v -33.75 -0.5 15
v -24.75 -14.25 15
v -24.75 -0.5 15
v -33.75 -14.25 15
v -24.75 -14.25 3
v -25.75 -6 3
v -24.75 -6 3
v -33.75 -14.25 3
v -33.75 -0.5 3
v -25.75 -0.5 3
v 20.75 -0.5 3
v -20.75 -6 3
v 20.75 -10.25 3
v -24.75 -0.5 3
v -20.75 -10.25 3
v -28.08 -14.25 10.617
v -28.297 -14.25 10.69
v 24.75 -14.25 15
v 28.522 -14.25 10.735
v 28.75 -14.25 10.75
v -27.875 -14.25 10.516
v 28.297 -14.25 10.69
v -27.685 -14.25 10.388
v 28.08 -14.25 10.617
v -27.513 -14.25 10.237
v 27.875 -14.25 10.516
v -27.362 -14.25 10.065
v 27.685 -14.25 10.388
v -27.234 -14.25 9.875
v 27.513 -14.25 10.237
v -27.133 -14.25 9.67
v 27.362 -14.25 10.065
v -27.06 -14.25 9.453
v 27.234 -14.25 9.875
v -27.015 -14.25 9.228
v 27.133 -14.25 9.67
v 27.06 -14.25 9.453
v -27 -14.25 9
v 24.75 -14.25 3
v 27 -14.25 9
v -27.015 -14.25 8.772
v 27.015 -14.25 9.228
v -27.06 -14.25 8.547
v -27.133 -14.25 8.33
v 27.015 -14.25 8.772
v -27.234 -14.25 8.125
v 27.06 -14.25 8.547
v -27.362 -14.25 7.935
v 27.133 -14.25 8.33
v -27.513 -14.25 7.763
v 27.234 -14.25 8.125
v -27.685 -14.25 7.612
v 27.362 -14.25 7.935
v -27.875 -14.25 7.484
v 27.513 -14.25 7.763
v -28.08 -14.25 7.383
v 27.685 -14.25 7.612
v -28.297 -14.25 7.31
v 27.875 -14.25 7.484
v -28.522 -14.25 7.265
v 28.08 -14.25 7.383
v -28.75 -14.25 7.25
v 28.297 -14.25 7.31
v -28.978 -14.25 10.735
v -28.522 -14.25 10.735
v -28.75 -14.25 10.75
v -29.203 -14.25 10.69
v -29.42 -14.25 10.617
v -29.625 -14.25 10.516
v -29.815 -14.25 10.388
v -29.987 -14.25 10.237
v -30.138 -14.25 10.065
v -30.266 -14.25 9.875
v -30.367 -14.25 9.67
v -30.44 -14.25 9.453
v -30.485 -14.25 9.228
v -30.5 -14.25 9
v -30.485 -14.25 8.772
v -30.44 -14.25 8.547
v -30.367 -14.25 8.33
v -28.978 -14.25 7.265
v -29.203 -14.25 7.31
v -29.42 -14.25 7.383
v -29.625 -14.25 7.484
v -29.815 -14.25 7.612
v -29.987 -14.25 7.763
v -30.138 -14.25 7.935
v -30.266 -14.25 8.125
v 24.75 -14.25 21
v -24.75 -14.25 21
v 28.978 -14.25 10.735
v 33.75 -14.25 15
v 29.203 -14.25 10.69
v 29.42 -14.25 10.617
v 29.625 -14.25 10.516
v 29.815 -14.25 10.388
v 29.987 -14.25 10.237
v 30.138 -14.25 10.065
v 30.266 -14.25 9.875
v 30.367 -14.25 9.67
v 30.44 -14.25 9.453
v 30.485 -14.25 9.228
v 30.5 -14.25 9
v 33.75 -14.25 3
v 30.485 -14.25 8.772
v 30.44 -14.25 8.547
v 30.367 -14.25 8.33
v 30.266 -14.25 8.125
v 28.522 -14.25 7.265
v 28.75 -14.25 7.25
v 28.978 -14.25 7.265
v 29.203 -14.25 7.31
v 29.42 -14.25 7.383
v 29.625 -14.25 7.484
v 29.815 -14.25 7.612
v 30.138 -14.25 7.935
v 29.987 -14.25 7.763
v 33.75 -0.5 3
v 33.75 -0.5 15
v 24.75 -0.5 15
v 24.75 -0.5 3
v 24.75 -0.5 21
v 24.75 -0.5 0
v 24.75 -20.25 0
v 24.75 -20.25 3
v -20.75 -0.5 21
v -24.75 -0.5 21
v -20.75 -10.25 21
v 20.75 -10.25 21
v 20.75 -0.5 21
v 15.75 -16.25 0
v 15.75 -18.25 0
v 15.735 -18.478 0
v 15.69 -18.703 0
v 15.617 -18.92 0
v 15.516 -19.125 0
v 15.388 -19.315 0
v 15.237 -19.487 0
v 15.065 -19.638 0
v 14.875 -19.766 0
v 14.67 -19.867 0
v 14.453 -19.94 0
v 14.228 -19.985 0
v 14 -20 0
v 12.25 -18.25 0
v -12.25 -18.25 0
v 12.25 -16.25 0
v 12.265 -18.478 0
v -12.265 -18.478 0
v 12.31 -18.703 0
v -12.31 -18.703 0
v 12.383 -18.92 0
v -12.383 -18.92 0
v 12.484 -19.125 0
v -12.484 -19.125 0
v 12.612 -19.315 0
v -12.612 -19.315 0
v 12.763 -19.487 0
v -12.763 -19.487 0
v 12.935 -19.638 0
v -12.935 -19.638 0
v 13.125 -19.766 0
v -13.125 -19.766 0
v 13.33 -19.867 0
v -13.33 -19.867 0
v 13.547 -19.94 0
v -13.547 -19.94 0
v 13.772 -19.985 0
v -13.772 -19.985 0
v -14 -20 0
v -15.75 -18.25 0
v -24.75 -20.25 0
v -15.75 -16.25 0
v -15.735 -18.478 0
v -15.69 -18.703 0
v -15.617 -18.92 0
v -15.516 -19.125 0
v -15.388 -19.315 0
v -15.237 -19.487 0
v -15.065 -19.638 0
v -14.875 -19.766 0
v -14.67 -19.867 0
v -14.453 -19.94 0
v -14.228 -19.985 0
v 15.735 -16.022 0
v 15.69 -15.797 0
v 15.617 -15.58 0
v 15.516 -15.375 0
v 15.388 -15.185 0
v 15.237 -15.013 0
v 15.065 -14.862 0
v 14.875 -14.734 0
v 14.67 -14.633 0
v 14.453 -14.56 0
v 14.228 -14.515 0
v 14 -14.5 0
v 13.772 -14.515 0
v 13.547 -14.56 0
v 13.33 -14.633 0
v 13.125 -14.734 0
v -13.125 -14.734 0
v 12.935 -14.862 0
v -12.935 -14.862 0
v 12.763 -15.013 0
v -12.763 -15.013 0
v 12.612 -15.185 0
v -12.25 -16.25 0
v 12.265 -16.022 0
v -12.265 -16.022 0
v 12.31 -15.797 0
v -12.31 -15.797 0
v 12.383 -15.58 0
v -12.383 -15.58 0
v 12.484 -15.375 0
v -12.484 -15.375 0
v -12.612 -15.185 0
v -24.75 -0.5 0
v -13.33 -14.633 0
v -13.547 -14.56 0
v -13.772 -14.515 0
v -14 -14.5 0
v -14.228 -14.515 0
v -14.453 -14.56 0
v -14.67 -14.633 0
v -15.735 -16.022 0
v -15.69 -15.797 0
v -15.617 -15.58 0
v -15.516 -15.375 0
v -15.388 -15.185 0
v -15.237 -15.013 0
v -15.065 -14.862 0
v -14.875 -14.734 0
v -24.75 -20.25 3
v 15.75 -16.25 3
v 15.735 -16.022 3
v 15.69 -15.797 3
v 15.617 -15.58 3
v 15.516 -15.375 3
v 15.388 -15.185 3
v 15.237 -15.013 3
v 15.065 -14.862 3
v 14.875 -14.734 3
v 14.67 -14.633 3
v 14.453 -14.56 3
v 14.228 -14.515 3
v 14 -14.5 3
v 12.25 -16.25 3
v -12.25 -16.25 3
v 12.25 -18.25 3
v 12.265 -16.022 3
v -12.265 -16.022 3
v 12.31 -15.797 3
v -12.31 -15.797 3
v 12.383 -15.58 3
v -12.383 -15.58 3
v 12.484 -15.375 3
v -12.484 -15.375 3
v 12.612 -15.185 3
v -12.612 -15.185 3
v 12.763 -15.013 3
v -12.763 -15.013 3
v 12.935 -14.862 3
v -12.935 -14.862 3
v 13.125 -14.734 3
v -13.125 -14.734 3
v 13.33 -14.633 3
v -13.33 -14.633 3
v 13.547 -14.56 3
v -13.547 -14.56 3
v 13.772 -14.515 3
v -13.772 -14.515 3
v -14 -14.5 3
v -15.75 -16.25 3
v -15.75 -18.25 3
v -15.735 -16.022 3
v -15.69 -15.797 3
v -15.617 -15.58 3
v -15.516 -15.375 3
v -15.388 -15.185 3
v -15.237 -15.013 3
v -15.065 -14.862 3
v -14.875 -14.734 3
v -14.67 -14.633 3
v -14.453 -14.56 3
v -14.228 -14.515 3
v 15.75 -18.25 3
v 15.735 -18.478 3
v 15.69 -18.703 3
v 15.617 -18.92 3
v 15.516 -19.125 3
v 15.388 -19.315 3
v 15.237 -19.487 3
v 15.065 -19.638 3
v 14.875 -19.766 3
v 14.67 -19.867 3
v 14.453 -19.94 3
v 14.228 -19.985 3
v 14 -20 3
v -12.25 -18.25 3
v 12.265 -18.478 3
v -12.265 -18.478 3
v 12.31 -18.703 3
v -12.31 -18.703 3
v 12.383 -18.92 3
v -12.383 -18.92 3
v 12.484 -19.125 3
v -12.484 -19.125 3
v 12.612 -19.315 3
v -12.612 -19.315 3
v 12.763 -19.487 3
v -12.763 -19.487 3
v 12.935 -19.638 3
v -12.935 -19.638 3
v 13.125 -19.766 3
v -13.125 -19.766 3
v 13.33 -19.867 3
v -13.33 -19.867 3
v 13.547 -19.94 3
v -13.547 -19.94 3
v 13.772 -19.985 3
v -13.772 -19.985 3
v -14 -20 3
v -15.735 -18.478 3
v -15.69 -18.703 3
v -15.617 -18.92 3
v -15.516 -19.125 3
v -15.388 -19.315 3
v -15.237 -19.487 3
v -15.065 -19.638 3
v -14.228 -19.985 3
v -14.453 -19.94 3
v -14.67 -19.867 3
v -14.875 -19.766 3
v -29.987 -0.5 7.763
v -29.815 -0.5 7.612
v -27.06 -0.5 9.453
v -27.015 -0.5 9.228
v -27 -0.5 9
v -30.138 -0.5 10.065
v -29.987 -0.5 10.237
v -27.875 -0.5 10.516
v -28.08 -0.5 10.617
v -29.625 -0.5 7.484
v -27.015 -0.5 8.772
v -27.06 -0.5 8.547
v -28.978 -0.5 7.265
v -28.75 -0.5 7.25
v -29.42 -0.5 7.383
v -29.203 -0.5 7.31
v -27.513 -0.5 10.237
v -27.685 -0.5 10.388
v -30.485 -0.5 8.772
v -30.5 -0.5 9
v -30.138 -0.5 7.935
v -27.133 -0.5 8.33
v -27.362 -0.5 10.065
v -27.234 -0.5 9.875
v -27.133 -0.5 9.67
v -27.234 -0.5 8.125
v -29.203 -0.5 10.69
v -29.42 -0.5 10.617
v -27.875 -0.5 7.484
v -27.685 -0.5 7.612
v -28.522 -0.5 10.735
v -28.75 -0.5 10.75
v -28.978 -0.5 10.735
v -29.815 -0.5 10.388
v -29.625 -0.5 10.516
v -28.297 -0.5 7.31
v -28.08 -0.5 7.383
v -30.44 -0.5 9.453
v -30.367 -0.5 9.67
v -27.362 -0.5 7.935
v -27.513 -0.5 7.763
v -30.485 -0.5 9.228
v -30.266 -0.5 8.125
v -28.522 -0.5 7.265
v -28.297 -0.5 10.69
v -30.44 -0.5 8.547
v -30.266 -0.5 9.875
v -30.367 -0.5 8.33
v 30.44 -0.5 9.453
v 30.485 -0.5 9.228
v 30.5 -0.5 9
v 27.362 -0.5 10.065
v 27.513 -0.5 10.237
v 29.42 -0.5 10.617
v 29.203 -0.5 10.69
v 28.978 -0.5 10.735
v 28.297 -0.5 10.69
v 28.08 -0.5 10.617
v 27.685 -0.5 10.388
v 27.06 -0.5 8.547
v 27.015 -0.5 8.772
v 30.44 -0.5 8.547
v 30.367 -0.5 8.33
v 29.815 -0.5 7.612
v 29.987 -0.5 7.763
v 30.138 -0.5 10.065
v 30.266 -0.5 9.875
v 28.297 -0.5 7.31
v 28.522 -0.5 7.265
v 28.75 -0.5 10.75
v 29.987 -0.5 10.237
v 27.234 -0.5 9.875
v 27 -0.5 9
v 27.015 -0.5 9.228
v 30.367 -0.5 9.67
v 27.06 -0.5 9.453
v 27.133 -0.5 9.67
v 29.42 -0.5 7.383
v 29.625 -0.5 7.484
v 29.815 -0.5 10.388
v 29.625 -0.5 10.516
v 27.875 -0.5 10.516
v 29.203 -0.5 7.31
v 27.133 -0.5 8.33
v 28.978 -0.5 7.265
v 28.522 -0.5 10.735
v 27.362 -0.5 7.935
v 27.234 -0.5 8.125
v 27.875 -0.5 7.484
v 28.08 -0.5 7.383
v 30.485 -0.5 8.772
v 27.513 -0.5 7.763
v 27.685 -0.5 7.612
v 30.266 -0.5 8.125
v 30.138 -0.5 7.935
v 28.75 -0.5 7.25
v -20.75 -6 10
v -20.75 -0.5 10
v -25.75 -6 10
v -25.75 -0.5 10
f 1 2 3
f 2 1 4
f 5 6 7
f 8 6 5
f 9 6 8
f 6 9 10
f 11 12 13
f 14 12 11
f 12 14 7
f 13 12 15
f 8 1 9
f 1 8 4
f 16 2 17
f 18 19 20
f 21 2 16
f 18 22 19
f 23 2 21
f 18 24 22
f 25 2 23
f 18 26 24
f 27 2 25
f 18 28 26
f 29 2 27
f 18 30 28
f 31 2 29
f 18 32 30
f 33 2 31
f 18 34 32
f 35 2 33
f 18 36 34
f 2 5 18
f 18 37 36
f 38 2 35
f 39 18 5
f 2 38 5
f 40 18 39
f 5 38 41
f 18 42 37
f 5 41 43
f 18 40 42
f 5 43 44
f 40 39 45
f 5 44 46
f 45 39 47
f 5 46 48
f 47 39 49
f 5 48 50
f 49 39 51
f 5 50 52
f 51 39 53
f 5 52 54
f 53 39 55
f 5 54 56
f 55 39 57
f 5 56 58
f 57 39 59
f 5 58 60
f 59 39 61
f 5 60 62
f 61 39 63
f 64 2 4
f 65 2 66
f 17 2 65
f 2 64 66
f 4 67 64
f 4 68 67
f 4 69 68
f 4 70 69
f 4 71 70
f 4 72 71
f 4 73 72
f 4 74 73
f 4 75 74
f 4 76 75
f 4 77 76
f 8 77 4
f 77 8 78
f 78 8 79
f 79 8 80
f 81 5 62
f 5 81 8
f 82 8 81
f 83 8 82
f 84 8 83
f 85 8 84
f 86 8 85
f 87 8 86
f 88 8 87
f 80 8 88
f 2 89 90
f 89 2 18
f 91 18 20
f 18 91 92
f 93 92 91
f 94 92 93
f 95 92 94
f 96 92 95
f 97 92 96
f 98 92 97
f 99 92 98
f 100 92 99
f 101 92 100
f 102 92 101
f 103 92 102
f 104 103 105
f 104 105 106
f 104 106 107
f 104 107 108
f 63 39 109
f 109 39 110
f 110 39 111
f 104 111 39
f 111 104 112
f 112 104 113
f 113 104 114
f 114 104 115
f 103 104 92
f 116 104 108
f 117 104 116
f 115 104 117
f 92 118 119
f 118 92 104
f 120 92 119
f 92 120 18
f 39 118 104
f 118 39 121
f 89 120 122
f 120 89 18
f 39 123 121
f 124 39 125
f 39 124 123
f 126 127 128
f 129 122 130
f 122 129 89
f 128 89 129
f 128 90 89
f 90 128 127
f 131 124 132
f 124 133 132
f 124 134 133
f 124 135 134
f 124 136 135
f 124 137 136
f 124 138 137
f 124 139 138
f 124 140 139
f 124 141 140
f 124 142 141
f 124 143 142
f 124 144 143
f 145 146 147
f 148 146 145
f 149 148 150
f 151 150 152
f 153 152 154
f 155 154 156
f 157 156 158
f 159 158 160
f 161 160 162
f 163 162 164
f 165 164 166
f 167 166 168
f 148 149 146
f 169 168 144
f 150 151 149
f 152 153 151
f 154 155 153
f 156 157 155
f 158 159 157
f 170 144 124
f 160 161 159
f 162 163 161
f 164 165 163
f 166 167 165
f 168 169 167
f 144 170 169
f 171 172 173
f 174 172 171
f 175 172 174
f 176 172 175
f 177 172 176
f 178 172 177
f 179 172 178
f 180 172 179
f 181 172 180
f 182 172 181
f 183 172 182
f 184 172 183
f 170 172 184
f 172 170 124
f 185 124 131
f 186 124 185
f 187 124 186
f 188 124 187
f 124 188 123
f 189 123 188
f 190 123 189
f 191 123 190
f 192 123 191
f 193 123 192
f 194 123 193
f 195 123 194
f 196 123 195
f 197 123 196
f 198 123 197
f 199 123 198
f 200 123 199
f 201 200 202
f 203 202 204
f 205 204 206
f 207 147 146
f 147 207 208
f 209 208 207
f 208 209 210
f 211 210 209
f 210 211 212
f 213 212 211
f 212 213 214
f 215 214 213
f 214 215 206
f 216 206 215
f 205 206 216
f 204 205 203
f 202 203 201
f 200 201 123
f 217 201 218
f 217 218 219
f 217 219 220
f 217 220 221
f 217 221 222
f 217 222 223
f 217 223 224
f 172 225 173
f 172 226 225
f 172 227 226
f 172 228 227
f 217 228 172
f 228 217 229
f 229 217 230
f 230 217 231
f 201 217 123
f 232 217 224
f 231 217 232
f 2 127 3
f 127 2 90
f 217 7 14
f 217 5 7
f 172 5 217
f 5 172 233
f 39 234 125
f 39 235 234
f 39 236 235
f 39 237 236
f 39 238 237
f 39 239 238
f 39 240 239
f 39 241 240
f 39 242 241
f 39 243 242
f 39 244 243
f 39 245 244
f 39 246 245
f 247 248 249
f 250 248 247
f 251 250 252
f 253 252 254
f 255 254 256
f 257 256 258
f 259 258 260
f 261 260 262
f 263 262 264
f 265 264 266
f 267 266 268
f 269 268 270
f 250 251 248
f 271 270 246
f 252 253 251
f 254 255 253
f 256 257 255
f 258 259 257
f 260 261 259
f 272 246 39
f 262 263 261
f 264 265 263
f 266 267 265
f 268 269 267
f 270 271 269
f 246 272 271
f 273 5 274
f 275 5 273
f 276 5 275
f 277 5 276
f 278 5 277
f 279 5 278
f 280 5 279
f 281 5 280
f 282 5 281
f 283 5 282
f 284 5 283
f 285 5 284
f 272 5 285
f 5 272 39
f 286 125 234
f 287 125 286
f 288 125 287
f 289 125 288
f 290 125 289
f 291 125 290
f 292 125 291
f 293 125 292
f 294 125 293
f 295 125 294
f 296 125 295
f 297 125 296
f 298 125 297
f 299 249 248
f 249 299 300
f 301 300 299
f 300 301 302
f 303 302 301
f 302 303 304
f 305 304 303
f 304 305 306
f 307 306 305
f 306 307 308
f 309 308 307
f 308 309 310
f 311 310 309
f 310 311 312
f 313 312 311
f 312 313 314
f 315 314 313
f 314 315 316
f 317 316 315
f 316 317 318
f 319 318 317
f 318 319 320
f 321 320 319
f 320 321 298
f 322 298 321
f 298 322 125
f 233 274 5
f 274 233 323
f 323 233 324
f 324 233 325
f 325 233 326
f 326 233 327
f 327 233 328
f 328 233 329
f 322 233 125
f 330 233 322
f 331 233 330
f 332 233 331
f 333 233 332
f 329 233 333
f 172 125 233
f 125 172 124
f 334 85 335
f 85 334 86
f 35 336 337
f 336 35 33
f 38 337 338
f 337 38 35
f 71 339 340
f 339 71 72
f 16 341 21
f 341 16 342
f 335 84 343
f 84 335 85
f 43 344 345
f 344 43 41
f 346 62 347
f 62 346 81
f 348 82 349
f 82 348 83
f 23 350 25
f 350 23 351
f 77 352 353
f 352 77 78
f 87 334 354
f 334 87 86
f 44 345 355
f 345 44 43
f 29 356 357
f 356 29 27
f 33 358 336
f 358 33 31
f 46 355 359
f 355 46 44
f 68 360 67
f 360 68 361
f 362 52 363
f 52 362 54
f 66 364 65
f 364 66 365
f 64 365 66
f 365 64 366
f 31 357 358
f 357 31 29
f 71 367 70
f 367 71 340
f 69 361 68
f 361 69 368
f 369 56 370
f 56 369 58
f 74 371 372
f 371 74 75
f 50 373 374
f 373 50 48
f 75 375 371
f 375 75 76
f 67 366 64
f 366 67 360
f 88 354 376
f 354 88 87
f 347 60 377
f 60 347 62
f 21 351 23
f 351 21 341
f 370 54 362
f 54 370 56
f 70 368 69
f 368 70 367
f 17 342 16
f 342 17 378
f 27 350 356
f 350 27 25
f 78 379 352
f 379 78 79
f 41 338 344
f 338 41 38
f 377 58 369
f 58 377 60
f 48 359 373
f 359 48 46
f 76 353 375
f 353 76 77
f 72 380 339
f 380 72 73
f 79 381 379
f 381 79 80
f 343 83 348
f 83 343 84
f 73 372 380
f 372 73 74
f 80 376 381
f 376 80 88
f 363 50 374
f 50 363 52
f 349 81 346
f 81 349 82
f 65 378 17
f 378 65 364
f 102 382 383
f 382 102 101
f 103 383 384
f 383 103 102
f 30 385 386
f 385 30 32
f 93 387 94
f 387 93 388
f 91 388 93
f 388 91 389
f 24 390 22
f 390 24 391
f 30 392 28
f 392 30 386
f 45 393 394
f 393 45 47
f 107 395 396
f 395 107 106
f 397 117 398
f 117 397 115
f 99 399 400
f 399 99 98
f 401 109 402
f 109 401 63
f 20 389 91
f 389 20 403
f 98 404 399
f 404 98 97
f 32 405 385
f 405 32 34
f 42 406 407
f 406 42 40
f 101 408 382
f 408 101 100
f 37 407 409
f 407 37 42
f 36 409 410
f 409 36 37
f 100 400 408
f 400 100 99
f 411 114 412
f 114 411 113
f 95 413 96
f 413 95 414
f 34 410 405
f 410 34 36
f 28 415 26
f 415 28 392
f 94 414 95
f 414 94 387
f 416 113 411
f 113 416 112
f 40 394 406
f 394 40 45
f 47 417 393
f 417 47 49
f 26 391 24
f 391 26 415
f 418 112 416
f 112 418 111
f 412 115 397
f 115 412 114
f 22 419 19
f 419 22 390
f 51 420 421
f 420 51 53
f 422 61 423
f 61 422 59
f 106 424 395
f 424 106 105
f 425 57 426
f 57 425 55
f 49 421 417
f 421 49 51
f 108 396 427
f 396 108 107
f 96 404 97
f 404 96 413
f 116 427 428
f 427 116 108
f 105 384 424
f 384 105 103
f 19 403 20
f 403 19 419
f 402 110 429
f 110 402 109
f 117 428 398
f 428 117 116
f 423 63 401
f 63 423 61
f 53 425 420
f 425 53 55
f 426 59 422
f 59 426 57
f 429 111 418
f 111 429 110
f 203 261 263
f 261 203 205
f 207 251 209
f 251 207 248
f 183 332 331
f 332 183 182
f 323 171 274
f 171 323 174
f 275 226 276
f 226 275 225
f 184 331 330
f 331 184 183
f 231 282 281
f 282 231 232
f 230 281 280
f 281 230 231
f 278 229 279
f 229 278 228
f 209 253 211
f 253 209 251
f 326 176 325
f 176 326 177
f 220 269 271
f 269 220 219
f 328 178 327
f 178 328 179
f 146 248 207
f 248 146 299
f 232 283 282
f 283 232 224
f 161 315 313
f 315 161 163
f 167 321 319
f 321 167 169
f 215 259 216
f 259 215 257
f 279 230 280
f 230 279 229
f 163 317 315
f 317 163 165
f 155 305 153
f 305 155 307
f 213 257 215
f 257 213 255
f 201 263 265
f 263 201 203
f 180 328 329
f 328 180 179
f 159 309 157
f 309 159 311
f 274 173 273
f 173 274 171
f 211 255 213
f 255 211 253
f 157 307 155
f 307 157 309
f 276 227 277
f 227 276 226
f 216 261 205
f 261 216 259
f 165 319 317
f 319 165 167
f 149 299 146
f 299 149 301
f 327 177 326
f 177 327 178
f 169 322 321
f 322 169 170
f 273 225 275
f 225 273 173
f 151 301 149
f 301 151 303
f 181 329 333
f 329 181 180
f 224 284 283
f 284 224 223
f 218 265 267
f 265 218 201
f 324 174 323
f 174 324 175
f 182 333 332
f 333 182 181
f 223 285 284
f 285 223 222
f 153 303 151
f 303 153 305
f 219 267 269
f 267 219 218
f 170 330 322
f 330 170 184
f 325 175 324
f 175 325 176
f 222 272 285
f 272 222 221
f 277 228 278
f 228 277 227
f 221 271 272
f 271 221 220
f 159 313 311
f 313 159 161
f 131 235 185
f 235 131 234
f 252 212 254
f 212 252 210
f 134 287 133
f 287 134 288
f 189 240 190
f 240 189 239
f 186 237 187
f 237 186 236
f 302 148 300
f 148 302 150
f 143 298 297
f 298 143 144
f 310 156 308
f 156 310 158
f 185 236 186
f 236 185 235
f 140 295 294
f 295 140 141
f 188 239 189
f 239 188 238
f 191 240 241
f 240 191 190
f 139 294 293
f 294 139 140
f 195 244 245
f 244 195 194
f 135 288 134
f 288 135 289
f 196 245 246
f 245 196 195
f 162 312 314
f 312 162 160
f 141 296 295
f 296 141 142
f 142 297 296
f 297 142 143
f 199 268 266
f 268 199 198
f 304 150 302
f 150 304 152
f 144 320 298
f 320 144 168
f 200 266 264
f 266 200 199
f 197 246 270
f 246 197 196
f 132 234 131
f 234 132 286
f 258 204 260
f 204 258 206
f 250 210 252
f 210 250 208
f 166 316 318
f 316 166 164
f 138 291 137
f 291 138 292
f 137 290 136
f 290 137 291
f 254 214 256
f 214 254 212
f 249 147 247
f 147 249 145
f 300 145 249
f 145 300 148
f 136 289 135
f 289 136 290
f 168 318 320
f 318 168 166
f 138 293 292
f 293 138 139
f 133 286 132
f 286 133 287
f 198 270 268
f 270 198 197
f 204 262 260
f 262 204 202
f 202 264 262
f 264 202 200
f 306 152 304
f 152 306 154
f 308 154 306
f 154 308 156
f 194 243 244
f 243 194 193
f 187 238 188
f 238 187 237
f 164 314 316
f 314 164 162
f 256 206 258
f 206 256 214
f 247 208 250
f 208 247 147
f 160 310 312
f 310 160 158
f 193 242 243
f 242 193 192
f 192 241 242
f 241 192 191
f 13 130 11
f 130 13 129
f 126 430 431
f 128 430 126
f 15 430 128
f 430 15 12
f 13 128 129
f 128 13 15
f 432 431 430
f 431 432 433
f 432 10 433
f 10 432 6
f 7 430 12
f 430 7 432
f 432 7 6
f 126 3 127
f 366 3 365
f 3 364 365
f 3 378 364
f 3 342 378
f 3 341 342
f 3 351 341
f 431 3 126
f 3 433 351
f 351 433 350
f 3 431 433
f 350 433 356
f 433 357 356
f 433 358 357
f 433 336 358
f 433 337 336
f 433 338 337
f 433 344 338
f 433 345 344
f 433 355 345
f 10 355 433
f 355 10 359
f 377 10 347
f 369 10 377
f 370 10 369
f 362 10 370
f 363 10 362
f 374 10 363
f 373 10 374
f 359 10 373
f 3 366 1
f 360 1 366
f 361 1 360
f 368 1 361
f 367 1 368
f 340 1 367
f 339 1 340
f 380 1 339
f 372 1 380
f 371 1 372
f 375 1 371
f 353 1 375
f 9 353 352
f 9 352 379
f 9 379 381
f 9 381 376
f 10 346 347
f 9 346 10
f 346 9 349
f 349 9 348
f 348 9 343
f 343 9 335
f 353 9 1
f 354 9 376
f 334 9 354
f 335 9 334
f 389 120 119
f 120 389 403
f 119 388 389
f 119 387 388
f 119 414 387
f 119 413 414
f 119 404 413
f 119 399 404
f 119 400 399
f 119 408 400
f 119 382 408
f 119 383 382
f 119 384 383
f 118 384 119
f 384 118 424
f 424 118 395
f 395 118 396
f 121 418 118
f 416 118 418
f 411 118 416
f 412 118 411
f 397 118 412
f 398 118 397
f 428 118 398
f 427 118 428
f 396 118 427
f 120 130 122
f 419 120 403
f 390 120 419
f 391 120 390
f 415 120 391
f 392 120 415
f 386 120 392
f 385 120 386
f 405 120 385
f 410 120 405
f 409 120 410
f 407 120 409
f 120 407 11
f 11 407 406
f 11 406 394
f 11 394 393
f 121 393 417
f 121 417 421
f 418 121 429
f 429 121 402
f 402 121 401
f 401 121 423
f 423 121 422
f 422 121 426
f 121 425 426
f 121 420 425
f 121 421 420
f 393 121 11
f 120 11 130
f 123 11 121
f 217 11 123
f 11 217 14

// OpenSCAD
// MEC-122: printable, adjustable split cradle. Units mm.
// Body envelope from TowerPro MG996R; mounting ears/horn are deliberately
// above the cradle. Verify lower-case shape and cable exit with the coupon.
part = "left"; // left, right, coupon, assembly
$fn = 48;
body_length = 40.7;
body_width = 19.7;
body_height = 42.9;
clearance = 0.8; // total pocket allowance, not per side
split_gap = 1.0; // allows closing the halves to grip the actual case
floor_t = 3;
wall_t = 4;
grip_height = 18;
bolt_d = 3.5;
L = body_length + clearance;
W = body_width + clearance;
outer_L = L + 2*wall_t;
outer_W = W + 2*wall_t;
lug_x = outer_L/2 + 4;
assert(grip_height < body_height);
assert(clearance < split_gap);

module yhole(x,z,d=bolt_d) {
    translate([x,0,z]) rotate([90,0,0])
        cylinder(d=d,h=outer_W+4,center=true);
}
module raw_cradle(height=grip_height) {
    difference() {
        union() {
            translate([-outer_L/2,-outer_W/2,0])
                cube([outer_L,outer_W,floor_t+height]);
            // Two accessible bolt lugs beyond the servo's short ends.
            for (s=[-1,1]) translate([s*lug_x,0,9])
                cube([10,outer_W,12],center=true);
            // Base flange for mounting to the eventual leg/frame.
            translate([-outer_L/2,-(outer_W+12)/2,0])
                cube([outer_L,outer_W+12,floor_t]);
        }
        translate([-L/2,-W/2,floor_t]) cube([L,W,height+1]);
        // Cable relief at one short end; no exact exit position assumed.
        translate([-outer_L/2-1,-6,floor_t]) cube([wall_t+2,12,7]);
        for (s=[-1,1]) yhole(s*lug_x,9);
        for (x=[-14,14],y=[-(outer_W/2+3),outer_W/2+3])
            hull() for (dy=[-1,1])
                translate([x,y+dy,-1]) cylinder(d=bolt_d,h=floor_t+2);
    }
}
module half(side=1,height=grip_height) {
    intersection() {
        raw_cradle(height);
        translate([-60,side>0 ? split_gap/2 : -60,-1])
            cube([120,60-split_gap/2,height+floor_t+2]);
    }
}
if (part=="left") half(-1);
else if (part=="right") half(1);
else if (part=="coupon") {
    // Short body-section check uses the same pocket and split geometry.
    half(-1,6);
    translate([0,outer_W+18,0]) half(1,6);
}
else if (part=="assembly") {
    color("orange") half(-1);
    color("gold") half(1);
    color([0.2,0.2,0.2,0.35])
        translate([-body_length/2,-body_width/2,floor_t])
            cube([body_length,body_width,body_height]);
}
else assert(false,"Unknown part selector");
